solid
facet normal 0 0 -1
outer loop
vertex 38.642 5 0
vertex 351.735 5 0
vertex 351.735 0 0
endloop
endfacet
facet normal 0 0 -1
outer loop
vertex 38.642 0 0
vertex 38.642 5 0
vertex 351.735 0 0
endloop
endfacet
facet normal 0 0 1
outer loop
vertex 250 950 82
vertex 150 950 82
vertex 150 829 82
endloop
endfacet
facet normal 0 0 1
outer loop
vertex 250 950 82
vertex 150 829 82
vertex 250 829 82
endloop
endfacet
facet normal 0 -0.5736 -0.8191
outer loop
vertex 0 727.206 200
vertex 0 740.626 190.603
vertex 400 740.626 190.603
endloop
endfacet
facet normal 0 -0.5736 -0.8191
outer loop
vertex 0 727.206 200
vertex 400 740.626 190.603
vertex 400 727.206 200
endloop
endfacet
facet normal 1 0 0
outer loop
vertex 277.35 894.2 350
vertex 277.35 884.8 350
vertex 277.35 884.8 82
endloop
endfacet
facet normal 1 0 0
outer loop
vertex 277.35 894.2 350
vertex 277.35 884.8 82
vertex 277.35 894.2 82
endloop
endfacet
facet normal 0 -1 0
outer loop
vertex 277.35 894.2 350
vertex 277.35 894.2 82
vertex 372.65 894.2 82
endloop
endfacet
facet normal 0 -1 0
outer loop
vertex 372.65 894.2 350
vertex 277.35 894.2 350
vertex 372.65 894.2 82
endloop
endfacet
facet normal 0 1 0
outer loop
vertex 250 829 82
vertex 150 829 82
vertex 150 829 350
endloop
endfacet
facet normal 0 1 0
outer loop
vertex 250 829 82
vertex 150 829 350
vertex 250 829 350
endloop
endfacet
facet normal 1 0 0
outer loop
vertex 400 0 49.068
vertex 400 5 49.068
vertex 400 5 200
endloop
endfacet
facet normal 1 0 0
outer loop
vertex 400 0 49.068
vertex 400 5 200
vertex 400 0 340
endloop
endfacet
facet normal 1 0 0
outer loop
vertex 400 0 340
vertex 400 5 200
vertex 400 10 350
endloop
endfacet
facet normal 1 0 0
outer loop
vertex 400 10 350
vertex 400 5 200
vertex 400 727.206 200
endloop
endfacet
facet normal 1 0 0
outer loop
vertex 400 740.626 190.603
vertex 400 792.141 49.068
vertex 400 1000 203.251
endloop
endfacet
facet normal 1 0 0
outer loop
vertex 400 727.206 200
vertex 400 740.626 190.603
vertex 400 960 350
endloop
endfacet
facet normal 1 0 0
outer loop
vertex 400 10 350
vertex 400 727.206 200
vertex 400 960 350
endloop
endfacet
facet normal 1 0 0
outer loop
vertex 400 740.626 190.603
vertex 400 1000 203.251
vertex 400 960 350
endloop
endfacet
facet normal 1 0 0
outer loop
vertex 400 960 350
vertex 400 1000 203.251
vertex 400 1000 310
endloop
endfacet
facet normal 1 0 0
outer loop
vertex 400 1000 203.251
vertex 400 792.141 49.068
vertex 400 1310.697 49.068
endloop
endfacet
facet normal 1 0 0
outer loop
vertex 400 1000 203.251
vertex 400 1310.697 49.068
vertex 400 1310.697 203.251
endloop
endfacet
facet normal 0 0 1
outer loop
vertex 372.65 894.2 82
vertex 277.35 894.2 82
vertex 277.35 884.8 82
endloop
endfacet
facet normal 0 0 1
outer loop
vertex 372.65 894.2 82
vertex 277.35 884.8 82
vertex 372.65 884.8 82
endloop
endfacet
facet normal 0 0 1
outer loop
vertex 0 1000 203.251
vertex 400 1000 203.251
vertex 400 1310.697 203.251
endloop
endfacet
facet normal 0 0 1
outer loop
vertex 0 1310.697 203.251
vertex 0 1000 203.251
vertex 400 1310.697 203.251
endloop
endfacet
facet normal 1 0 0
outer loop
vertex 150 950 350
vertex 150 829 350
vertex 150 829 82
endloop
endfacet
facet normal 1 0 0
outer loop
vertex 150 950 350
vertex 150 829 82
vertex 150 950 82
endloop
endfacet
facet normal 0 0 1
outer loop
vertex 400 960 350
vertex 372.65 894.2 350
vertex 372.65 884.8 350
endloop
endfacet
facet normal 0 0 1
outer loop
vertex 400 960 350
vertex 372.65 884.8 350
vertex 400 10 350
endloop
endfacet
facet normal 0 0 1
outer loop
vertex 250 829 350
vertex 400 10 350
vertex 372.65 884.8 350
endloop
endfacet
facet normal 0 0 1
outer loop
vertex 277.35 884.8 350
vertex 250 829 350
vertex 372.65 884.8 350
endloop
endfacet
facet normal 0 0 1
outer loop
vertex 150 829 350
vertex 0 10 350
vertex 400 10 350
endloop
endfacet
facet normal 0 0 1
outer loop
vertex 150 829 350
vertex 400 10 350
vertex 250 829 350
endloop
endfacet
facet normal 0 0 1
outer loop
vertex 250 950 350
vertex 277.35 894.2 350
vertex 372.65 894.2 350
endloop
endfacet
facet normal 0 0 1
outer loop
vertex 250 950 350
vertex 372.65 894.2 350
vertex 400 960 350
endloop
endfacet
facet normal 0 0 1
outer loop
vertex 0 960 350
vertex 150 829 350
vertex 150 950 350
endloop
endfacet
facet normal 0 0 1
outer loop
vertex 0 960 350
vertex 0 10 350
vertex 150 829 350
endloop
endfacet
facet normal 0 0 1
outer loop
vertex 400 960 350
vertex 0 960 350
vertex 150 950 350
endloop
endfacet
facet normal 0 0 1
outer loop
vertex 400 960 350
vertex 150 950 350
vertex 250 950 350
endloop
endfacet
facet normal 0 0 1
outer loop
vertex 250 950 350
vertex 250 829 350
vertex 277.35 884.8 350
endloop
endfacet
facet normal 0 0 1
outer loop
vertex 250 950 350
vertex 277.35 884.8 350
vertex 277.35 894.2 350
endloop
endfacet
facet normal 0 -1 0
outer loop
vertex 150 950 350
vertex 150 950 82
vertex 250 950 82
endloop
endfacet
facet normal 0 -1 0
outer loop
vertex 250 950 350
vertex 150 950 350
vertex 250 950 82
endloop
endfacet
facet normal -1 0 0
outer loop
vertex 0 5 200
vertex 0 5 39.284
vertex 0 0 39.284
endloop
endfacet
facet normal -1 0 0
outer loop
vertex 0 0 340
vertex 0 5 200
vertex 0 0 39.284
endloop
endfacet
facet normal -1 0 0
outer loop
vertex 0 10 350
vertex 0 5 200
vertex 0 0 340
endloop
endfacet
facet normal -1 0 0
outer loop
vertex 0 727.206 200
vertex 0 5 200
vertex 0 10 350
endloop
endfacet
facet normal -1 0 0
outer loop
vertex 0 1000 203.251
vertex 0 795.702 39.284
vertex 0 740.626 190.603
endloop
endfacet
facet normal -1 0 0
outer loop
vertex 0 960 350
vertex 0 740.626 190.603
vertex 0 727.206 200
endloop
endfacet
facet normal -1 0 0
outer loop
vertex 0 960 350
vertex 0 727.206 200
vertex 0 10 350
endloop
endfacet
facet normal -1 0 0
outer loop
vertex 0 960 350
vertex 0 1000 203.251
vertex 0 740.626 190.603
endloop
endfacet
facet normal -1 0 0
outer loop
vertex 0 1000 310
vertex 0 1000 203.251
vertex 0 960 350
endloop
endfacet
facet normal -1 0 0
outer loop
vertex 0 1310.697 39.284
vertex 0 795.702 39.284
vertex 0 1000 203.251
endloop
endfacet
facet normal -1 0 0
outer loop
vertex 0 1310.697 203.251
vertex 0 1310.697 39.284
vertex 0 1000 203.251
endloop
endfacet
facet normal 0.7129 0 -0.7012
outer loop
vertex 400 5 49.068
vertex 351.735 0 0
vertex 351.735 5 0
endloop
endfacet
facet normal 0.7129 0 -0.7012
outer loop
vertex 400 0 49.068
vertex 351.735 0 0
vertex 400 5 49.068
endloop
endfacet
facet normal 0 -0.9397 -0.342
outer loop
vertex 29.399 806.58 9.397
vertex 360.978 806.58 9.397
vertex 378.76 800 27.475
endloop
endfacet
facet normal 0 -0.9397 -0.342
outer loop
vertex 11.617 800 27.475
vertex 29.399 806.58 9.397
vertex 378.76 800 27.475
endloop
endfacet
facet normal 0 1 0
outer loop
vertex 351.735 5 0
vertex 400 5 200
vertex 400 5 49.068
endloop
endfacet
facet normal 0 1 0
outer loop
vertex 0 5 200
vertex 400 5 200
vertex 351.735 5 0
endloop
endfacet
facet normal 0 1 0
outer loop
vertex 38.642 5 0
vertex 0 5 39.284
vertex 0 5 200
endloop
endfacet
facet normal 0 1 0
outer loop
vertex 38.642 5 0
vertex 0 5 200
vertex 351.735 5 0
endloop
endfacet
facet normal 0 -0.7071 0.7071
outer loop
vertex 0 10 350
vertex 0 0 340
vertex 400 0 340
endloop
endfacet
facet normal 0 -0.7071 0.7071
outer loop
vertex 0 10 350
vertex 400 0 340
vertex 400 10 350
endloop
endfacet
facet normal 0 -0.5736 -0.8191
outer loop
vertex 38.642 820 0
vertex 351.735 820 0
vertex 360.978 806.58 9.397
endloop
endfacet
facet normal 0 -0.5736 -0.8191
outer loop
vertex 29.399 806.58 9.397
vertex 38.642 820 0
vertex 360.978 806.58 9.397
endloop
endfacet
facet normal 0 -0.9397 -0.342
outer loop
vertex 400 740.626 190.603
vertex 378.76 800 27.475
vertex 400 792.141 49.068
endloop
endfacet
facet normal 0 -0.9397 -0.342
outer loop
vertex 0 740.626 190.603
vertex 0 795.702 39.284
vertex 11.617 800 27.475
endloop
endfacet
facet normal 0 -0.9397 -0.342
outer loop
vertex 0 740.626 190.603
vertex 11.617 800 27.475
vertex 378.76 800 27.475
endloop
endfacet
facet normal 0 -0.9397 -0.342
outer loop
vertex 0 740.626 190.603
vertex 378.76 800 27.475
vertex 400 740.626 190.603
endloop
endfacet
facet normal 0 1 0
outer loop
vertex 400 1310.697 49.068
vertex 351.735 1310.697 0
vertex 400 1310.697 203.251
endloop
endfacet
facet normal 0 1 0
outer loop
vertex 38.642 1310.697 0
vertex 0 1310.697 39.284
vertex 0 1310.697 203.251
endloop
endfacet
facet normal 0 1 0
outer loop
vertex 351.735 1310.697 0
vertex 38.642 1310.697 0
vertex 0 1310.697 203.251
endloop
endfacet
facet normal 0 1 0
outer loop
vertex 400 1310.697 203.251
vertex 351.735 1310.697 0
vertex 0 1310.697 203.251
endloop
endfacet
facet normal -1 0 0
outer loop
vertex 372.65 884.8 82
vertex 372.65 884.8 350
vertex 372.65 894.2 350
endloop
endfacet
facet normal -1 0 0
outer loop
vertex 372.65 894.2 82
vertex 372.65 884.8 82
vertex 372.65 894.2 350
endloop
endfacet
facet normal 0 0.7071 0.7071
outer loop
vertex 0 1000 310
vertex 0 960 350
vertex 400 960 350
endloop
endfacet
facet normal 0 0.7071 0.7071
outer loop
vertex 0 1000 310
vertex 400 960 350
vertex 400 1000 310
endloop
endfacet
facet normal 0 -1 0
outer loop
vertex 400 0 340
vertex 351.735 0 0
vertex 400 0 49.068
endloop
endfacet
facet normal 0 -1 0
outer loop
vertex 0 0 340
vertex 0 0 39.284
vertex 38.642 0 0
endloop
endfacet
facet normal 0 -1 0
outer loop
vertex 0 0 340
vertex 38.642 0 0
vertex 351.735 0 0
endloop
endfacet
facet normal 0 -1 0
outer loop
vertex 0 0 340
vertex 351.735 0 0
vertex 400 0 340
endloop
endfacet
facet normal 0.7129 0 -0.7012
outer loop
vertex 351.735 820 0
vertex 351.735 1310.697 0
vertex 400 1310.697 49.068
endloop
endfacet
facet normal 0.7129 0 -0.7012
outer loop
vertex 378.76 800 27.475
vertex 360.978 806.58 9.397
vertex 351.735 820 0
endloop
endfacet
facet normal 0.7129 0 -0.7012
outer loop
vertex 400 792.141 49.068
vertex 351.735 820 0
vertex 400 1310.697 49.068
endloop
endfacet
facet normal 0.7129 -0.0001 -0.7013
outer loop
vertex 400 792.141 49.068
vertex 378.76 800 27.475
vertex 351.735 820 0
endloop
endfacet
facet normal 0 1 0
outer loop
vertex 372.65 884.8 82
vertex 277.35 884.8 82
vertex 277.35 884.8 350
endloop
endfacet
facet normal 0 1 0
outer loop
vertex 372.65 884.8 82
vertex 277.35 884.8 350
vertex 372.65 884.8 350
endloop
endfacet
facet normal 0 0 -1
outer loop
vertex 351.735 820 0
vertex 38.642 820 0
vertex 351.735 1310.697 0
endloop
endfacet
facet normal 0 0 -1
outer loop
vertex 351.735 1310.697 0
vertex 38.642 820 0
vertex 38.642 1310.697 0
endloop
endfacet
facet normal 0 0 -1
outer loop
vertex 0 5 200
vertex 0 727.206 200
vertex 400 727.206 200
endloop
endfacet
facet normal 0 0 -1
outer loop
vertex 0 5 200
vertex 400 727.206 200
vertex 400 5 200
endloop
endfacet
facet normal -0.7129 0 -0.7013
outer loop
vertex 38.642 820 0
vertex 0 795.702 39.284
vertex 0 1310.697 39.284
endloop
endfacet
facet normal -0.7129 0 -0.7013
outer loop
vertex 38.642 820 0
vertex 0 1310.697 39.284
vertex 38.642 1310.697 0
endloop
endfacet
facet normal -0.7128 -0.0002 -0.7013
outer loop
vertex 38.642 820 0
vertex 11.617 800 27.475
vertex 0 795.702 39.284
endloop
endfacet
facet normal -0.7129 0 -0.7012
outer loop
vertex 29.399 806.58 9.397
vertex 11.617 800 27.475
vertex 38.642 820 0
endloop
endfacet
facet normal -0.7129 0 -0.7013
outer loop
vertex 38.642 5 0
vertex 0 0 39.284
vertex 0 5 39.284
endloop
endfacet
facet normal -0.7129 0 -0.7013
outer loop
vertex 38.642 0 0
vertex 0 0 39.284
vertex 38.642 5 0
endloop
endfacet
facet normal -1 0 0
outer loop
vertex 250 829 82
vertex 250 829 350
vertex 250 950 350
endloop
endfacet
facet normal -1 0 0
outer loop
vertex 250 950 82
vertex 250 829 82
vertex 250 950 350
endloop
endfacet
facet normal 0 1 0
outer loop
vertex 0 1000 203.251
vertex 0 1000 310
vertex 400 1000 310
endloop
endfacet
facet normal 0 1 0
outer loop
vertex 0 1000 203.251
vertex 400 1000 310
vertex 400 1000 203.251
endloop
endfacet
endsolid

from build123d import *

# Parameters (mm, degrees)
BOSS_EXTRUDE1_DEPTH     = 400
SKETCH2_W               = 100
SKETCH2_H               = 121
SKETCH2_W_2             = 95.3
SKETCH2_H_2             = 9.4
CUT_EXTRUDE1_DEPTH      = 268
CUT_EXTRUDE2_DEPTH      = 1
CUT_EXTRUDE2_DEPTH_BACK = 1311.69690242


with BuildPart() as part:
    # Sketch1 → Boss-Extrude1 (new body)
    with BuildSketch(Plane(origin=(0, 0, 0), x_dir=(0, 0, -1), z_dir=(1, 0, 0))):
        Polygon((0, 0), (-340, 0), (-350, 10), (-350, 960), (-310, 1000), (-203.251091608, 1000), (-203.251091608, 1310.69690242), (-108.48888922, 1310.69690242), (0, 1310.69690242), (0, 1000), (0, 970), (0, 820), (-9.396926208, 806.579798567), (-27.474774195, 800), (-190.603073792, 740.62615458), (-200, 727.205953147), (-200, 5), (0, 5), align=None)
    extrude(amount=BOSS_EXTRUDE1_DEPTH)

    # Sketch2 → Cut-Extrude1 (cut)
    with BuildSketch(Plane.XY.offset(350)):
        with Locations((200, 889.5)):
            Rectangle(SKETCH2_W, SKETCH2_H)
        with Locations((325, 889.5)):
            Rectangle(SKETCH2_W_2, SKETCH2_H_2)
    extrude(amount=-CUT_EXTRUDE1_DEPTH, mode=Mode.SUBTRACT)

    # Sketch3 → Cut-Extrude2 (cut, two sides)
    with BuildSketch(Plane(origin=(0, 0, 0), x_dir=(-1, 0, 0), z_dir=(0, -1, 0))) as cut_extrude2_sk:
        Polygon((32.971910004, -72.804395349), (-67.728153305, 29.569560354), (-322.648629759, 29.569560354), (-423.348693067, -72.804395349), (-423.348693067, 100.069531779), (32.971910004, 100.069531779), align=None)
    extrude(amount=CUT_EXTRUDE2_DEPTH, mode=Mode.SUBTRACT)
    extrude(cut_extrude2_sk.sketch, amount=-CUT_EXTRUDE2_DEPTH_BACK, mode=Mode.SUBTRACT)


solid = part.part
